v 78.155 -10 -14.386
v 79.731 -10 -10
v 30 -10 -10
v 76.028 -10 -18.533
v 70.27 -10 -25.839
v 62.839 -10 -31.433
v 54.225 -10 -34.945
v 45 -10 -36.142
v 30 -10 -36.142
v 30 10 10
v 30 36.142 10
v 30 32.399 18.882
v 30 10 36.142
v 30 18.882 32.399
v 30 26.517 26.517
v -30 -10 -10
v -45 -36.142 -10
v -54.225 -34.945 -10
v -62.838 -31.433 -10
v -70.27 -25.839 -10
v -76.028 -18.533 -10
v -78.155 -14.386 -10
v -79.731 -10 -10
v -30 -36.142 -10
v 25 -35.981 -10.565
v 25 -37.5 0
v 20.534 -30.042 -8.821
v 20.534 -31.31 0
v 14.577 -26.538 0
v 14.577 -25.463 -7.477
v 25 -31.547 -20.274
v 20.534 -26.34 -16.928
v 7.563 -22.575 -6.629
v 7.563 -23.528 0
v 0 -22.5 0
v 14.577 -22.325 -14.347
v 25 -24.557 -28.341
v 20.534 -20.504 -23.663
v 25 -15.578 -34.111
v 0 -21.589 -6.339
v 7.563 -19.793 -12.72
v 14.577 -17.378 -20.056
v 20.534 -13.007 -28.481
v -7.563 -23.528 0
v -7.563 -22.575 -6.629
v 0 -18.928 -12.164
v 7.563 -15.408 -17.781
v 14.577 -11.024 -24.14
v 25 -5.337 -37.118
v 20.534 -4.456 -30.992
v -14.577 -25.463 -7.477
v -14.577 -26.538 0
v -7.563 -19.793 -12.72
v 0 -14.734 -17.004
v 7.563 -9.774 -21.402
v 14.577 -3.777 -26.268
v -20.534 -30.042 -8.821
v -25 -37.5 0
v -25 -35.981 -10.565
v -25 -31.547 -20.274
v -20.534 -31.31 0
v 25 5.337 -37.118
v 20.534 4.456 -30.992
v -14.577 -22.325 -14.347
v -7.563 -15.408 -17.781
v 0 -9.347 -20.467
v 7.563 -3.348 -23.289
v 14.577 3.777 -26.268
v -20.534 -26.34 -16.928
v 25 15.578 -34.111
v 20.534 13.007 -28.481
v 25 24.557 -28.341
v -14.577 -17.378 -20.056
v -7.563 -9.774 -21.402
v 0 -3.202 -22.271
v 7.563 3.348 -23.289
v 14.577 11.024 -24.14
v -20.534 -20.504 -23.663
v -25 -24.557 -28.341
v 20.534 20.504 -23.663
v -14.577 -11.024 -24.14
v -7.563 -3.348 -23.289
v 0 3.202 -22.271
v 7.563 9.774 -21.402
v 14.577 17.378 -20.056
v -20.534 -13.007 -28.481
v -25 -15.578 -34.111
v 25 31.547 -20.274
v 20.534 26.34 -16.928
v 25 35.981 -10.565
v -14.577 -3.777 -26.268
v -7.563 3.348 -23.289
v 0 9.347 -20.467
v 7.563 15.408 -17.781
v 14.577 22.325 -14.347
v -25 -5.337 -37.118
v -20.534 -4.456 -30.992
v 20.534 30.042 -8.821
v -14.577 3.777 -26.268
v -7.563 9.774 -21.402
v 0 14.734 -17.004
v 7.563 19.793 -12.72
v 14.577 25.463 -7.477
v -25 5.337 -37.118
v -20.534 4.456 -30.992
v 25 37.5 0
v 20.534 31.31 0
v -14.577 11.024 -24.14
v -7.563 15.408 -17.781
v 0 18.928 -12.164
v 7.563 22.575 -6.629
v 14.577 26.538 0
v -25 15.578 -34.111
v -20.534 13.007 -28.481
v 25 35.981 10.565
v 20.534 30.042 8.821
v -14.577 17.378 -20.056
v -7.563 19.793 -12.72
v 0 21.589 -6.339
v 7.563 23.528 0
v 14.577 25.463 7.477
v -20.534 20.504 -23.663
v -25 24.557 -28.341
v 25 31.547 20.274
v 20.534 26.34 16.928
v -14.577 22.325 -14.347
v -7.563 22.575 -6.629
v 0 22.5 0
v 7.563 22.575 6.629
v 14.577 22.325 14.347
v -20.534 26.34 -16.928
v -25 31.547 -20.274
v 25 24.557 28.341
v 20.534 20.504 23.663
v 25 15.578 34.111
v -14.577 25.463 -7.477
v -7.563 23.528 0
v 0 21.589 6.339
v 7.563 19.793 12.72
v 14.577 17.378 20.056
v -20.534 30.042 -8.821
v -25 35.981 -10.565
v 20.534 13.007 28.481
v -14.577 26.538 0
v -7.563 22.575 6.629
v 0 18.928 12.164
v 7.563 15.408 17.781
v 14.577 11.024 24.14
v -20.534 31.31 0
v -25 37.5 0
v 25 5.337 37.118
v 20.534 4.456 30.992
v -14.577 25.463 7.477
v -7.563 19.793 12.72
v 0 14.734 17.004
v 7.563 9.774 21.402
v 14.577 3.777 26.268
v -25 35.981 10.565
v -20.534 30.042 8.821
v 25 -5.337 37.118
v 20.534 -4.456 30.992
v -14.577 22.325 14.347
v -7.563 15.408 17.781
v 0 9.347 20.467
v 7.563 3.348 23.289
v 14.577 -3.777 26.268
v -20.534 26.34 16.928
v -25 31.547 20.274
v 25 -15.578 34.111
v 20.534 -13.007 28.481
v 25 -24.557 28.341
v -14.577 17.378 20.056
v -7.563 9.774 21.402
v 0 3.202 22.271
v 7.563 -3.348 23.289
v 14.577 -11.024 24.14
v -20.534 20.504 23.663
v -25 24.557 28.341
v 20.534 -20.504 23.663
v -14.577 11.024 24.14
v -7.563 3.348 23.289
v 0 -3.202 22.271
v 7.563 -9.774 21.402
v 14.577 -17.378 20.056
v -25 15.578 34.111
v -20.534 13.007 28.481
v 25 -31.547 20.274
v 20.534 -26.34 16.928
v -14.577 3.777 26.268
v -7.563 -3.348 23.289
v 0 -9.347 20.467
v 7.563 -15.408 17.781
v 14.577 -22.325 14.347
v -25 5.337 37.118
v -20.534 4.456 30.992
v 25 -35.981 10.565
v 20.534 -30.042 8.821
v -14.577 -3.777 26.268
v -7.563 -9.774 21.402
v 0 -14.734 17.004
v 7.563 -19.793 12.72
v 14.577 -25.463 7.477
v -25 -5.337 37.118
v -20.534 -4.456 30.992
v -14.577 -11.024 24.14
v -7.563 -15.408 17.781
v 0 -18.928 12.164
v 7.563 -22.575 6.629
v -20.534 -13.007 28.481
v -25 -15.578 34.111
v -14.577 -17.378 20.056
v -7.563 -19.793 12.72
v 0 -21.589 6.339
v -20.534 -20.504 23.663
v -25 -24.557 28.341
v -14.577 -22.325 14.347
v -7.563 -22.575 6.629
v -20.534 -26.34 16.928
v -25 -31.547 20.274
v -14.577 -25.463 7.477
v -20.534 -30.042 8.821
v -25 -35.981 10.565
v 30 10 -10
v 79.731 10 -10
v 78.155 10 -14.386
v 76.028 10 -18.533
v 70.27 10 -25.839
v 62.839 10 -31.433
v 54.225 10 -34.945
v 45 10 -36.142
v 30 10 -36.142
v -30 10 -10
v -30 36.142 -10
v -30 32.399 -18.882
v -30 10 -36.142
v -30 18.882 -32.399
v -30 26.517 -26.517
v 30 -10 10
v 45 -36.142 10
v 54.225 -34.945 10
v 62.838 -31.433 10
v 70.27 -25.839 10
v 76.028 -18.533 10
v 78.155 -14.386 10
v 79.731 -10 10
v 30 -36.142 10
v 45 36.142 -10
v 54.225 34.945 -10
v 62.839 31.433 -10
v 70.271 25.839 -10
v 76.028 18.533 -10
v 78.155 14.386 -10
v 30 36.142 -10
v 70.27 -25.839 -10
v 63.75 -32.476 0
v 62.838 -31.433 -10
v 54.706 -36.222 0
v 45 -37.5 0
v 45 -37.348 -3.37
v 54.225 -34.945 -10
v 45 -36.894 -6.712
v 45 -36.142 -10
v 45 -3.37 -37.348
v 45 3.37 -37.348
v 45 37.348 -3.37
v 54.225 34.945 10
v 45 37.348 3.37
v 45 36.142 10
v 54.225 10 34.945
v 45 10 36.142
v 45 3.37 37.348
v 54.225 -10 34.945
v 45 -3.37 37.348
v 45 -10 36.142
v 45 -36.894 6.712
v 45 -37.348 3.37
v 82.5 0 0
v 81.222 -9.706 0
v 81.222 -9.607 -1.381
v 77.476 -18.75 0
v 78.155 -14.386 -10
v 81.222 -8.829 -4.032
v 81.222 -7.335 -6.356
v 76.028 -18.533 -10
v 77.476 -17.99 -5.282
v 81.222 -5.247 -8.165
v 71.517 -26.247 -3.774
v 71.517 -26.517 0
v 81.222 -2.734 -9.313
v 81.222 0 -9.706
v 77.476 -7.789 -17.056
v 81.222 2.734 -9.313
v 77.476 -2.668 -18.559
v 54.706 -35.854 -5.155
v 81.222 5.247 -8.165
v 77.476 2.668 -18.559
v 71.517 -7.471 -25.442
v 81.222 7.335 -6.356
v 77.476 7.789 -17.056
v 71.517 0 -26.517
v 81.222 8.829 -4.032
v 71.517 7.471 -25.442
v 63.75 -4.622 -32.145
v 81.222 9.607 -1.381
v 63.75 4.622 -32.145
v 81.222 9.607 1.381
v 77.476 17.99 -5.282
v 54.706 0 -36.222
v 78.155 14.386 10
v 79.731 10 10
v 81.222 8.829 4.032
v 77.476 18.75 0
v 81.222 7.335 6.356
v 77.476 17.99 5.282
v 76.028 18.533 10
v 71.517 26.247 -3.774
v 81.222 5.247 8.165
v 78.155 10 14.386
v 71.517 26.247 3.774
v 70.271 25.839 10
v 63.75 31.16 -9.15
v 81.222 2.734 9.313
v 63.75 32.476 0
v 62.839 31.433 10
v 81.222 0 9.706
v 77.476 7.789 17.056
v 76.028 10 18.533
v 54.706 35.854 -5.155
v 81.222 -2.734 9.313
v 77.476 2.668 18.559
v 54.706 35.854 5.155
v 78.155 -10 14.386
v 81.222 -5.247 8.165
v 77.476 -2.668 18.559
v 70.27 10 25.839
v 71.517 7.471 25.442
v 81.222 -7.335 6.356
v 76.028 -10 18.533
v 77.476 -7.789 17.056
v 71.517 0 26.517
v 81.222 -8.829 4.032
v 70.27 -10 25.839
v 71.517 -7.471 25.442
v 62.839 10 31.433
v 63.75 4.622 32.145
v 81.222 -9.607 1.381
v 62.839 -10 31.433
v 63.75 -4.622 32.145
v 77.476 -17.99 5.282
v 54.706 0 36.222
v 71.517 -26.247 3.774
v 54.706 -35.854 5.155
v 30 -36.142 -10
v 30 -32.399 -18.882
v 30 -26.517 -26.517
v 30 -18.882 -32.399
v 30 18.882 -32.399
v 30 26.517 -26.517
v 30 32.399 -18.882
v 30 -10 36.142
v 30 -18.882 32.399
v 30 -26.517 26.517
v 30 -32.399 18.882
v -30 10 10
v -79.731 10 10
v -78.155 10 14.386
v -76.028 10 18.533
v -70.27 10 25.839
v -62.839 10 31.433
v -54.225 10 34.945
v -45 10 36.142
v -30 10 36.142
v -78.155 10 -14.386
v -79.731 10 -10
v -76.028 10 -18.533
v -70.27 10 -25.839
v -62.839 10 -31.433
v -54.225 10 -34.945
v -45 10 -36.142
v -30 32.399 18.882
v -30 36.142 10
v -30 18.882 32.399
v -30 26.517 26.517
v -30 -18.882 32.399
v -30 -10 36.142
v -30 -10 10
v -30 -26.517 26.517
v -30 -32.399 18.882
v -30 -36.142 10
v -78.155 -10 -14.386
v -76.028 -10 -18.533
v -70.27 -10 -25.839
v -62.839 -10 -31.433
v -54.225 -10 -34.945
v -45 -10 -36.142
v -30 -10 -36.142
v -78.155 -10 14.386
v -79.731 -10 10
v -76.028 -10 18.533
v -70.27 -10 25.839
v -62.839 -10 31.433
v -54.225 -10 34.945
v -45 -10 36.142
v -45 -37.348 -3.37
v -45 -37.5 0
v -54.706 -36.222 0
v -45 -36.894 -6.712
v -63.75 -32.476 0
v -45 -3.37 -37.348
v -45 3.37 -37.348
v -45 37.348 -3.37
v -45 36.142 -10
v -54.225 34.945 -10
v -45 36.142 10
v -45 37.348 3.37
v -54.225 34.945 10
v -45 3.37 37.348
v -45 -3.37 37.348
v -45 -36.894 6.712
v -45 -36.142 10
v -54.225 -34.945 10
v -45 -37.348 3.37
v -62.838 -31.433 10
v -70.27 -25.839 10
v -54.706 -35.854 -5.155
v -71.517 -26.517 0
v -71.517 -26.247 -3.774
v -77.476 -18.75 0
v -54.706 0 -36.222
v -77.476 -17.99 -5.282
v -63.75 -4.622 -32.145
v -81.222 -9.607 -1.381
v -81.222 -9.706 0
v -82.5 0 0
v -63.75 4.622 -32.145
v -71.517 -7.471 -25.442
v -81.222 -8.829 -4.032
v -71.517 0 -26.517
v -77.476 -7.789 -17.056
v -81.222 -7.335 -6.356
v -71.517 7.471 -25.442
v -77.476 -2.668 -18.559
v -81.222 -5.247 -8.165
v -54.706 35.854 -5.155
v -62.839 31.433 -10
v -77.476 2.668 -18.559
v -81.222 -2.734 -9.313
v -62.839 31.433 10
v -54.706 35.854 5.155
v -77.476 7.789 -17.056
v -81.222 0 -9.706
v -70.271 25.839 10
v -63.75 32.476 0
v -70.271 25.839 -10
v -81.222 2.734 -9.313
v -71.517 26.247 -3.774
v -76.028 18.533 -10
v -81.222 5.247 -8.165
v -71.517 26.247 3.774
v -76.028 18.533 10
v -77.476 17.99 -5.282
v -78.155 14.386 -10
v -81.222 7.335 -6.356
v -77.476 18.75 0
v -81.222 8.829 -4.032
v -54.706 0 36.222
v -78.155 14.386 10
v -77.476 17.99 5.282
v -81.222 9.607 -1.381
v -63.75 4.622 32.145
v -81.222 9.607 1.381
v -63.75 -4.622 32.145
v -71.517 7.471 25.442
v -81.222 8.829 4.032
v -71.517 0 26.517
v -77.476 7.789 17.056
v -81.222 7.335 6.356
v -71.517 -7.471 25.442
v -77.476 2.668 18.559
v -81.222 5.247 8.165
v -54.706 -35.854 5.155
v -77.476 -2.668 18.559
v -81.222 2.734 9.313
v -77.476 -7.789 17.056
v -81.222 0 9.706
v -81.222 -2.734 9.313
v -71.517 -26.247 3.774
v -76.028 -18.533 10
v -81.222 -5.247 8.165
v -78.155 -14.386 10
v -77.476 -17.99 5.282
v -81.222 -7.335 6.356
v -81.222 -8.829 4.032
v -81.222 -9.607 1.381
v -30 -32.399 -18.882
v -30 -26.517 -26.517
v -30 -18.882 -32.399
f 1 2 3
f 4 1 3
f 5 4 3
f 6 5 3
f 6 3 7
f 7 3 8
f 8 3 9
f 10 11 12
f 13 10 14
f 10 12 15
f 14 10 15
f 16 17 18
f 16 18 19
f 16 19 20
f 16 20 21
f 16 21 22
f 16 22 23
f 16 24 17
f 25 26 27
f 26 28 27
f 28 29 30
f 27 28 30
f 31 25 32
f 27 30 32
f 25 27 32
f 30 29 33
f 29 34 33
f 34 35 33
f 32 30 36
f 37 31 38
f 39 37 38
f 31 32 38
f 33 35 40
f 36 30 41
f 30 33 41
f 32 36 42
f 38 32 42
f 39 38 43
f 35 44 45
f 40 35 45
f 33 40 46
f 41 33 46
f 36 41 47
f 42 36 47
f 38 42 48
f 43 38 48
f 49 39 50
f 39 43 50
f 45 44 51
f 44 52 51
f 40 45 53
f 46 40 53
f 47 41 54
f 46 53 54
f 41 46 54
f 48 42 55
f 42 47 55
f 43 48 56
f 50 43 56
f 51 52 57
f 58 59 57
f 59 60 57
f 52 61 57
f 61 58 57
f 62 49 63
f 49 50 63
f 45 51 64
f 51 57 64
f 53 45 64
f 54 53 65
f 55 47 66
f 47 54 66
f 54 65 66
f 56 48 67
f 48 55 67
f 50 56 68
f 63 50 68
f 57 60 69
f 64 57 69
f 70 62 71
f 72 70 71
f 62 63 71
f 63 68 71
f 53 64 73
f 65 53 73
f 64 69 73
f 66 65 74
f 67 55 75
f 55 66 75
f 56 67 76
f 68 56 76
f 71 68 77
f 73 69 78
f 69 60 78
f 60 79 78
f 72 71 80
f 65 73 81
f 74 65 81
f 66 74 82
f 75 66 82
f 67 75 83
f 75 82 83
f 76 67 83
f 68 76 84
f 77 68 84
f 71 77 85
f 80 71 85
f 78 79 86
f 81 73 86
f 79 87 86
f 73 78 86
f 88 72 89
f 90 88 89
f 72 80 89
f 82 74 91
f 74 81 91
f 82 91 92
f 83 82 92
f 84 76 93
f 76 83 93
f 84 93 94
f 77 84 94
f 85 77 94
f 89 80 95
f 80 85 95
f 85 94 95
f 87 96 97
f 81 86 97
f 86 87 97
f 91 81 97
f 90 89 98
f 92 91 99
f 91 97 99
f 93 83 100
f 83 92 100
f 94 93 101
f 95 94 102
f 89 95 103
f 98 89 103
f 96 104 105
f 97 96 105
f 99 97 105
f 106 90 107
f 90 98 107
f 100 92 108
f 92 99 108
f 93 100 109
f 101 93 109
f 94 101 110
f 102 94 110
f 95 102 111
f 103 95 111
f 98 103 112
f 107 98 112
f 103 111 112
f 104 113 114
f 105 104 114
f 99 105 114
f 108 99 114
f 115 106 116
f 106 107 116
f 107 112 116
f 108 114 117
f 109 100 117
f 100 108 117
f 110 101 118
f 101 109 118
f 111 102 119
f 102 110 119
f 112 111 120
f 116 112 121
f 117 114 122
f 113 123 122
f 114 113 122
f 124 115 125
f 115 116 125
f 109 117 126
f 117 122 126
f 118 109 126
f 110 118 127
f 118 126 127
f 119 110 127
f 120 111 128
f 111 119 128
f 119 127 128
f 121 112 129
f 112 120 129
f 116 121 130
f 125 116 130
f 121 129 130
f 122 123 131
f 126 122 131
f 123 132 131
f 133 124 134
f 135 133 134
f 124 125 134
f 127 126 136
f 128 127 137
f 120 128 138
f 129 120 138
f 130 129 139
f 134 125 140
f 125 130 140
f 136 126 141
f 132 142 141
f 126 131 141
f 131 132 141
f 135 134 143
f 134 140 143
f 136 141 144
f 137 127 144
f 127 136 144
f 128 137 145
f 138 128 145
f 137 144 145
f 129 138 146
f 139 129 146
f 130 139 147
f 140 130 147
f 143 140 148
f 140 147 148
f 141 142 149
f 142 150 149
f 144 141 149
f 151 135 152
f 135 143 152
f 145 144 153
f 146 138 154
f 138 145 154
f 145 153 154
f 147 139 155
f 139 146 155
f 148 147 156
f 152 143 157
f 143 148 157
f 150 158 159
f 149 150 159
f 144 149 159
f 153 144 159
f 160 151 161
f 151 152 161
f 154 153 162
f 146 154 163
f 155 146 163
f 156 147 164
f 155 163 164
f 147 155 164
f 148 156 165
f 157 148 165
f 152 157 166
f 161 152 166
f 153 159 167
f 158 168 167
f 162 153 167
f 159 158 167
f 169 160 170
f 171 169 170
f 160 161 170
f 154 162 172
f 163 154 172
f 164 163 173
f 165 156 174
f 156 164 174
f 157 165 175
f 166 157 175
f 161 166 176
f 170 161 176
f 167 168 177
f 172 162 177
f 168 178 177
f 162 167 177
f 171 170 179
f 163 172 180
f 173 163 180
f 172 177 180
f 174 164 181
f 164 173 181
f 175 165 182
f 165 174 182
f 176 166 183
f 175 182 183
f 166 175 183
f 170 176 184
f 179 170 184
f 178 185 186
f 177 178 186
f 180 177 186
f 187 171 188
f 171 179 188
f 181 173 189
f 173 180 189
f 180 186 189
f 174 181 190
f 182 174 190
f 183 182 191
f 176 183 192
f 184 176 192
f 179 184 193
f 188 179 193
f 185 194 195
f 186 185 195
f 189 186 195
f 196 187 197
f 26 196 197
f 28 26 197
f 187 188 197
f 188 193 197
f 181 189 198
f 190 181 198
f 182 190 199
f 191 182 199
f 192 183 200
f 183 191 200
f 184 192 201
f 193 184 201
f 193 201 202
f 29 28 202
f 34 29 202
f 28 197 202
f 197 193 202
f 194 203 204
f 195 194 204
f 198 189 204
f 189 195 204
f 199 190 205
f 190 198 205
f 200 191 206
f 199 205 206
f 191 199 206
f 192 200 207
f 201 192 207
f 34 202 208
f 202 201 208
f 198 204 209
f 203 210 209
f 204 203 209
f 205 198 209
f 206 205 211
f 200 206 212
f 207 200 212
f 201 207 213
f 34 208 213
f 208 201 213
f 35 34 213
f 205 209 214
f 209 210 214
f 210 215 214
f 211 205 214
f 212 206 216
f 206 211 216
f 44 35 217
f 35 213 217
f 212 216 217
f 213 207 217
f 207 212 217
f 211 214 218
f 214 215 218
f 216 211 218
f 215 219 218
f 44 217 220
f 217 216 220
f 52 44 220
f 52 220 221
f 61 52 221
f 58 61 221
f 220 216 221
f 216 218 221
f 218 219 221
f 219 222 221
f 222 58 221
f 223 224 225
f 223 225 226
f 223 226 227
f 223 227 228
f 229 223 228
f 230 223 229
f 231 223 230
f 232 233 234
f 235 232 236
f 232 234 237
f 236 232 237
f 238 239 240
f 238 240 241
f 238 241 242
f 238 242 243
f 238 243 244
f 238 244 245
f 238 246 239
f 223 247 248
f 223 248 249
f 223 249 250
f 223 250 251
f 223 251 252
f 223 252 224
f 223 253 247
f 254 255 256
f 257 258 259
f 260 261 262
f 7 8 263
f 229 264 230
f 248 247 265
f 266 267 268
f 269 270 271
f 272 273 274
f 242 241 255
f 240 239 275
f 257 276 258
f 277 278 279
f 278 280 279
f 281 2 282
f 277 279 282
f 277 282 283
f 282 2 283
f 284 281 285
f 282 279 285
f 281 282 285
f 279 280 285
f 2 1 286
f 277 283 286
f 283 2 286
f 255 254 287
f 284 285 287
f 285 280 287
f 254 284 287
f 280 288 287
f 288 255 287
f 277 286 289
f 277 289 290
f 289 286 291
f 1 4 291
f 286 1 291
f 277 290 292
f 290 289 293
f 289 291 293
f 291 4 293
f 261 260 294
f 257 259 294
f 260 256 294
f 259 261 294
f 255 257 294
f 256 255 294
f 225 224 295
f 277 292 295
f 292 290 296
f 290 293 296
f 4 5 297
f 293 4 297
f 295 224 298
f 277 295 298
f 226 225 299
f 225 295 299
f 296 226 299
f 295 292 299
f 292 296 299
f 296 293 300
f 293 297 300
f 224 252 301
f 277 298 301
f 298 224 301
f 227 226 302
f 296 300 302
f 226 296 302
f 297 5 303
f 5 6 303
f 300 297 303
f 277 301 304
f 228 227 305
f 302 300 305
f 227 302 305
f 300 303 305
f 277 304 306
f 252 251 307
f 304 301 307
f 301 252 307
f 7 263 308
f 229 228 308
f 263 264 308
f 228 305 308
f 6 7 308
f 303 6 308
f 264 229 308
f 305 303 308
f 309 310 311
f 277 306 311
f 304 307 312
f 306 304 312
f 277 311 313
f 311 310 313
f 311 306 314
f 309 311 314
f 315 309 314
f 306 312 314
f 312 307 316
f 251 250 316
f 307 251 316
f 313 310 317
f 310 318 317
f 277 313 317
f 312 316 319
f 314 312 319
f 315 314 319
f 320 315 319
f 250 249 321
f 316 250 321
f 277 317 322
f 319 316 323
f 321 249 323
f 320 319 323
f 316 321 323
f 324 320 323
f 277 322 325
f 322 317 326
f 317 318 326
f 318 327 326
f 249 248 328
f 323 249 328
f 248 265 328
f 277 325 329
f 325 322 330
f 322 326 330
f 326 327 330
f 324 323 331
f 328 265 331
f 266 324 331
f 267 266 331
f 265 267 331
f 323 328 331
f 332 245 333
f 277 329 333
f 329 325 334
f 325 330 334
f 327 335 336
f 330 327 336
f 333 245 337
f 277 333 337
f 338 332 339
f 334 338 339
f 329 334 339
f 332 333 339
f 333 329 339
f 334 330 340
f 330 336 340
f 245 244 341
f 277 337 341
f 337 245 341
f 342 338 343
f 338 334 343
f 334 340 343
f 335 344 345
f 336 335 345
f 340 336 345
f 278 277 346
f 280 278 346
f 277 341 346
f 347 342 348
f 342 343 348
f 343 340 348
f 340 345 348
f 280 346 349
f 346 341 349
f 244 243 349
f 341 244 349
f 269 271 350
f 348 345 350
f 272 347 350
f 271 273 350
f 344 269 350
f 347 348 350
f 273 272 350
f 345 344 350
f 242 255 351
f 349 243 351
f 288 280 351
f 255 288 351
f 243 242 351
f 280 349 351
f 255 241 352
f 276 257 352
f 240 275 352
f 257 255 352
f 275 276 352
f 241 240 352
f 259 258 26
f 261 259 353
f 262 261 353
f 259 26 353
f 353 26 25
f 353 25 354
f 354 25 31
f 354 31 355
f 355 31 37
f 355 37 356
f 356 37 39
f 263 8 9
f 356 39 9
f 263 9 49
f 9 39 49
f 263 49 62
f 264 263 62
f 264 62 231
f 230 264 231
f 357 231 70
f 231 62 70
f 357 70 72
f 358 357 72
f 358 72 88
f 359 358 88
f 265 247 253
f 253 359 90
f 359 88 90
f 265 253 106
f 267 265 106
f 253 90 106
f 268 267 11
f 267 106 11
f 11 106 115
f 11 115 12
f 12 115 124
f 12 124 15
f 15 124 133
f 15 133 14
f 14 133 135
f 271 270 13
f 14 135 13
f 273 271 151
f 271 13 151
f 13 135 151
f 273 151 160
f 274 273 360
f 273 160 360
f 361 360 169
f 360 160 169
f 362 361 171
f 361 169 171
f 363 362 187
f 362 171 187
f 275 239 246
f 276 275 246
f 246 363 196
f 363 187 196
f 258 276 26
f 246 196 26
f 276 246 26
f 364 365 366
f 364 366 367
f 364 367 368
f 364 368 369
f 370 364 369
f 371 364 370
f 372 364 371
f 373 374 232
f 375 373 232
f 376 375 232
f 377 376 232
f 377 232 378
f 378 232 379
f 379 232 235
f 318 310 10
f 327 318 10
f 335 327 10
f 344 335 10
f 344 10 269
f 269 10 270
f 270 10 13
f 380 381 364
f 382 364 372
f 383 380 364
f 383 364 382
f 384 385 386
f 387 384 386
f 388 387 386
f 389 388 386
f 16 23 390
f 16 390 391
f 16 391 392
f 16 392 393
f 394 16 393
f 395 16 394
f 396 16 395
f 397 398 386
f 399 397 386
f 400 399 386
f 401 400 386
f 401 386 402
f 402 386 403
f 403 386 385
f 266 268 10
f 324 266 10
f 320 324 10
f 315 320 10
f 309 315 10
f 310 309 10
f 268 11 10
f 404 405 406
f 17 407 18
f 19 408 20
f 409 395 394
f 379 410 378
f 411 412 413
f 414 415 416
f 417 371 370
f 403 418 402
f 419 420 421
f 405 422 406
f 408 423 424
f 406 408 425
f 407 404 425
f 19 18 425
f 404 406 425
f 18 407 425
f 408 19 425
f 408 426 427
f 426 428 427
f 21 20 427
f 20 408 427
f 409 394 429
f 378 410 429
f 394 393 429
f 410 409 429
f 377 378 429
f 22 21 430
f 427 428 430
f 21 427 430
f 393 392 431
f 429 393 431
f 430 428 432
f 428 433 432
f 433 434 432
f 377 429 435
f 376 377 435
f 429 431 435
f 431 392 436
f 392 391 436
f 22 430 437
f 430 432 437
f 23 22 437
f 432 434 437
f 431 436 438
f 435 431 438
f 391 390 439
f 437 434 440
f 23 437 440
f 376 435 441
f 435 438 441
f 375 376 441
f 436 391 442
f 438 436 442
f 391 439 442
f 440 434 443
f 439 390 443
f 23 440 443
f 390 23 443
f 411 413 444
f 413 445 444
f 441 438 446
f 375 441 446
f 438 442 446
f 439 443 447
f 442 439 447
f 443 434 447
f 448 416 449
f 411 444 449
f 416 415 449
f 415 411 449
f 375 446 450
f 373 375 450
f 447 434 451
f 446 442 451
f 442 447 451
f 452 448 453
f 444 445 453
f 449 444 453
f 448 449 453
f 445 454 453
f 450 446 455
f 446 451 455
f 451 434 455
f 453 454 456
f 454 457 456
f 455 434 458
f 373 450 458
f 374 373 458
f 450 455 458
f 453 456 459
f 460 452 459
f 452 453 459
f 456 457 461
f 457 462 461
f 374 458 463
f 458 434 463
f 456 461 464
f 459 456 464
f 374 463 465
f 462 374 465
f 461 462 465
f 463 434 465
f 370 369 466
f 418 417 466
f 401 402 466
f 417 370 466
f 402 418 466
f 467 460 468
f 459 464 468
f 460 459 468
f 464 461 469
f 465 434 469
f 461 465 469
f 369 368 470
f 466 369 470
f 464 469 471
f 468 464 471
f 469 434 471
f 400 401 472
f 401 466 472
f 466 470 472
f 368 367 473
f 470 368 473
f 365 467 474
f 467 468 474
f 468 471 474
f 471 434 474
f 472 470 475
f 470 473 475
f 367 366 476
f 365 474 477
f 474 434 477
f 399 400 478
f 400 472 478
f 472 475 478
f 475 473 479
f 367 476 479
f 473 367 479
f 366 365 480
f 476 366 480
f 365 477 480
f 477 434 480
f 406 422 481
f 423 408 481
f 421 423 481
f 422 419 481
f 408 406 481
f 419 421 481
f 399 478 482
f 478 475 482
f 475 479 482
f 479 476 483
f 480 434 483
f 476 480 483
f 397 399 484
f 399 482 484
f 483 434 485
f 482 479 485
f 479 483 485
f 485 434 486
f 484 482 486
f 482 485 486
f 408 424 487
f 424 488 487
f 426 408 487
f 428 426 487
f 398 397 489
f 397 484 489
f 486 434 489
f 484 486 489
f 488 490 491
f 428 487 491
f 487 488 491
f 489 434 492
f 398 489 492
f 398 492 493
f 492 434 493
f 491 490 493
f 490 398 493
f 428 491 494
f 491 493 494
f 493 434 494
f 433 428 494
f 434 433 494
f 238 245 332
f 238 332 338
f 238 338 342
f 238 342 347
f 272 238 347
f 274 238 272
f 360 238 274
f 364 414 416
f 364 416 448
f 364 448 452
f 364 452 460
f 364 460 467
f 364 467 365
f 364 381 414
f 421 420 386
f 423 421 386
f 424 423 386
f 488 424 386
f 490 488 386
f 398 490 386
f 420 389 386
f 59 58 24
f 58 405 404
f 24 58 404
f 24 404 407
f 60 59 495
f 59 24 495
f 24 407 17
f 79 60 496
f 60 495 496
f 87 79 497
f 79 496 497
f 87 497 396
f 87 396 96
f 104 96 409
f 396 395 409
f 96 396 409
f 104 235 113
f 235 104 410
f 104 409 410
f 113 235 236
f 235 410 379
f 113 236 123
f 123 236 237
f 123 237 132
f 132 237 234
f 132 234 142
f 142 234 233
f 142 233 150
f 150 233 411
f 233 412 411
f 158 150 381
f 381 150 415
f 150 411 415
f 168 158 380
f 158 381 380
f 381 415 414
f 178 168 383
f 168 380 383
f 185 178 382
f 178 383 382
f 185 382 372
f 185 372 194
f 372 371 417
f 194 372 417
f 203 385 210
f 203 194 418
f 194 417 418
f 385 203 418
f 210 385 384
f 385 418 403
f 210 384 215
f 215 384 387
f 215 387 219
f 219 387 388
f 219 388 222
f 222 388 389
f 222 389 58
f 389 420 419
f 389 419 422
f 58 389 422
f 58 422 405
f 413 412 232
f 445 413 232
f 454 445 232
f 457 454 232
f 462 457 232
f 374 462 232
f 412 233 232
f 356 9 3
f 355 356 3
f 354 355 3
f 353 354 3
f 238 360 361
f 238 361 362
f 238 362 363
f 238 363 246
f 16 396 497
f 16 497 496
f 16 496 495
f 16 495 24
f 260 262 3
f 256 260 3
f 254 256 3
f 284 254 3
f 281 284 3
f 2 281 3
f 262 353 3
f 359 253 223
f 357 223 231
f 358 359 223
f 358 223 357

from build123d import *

# Parameters (mm, degrees)
CUT_EXTRUDE_1_DEPTH = 125.373429638


with BuildPart() as part:
    # 草图1 → 旋转1 (revolve)
    with BuildSketch(Plane.XY, mode=Mode.PRIVATE) as revolve_1_sk:
        with BuildLine():
            Line((45, 37.5), (25, 37.5))
            ThreePointArc((25, 37.5), (0, 22.5), (-25, 37.5))
            Line((-25, 37.5), (-45, 37.5))
            ThreePointArc((-45, 37.5), (-71.516504294, 26.516504294), (-82.5, 0))
            Line((-82.5, 0), (82.5, 0))
            ThreePointArc((82.5, 0), (71.516504294, 26.516504294), (45, 37.5))
        make_face()
    revolve(revolve_1_sk.sketch.rotate(Axis((-82.5, 0, 0), (1, 0, 0)), 180), axis=Axis((-82.5, 0, 0), (1, 0, 0)))

    # 草图2 → 切除-拉伸1 (cut, through all)
    with BuildSketch(Plane(origin=(30, 0, 0), x_dir=(0, 0, -1), z_dir=(1, 0, 0))):
        with BuildLine():
            Line((10, 36.142080737), (10, 10))
            Line((10, 10), (36.142080737, 10))
            ThreePointArc((36.142080737, 10), (26.516504294, 26.516504294), (10, 36.142080737))
        make_face()
        with BuildLine():
            Line((-10, 10), (-36.142080737, 10))
            ThreePointArc((-36.142080737, 10), (-26.516504294, 26.516504294), (-10, 36.142080737))
            Line((-10, 36.142080737), (-10, 10))
        make_face()
        with BuildLine():
            Line((-10, -10), (-36.142080737, -10))
            ThreePointArc((-36.142080737, -10), (-26.516504294, -26.516504294), (-10, -36.142080737))
            Line((-10, -36.142080737), (-10, -10))
        make_face()
        with BuildLine():
            Line((10, -10), (36.142080737, -10))
            ThreePointArc((36.142080737, -10), (26.516504294, -26.516504294), (10, -36.142080737))
            Line((10, -36.142080737), (10, -10))
        make_face()
    cut_extrude_1 = extrude(amount=CUT_EXTRUDE_1_DEPTH, mode=Mode.SUBTRACT)

    # 镜向1: 切除-拉伸1 across plane
    add(cut_extrude_1.mirror(Plane(origin=(0, 0, 0), x_dir=(0, 0, 1), z_dir=(1, 0, 0))), mode=Mode.SUBTRACT)


solid = part.part
